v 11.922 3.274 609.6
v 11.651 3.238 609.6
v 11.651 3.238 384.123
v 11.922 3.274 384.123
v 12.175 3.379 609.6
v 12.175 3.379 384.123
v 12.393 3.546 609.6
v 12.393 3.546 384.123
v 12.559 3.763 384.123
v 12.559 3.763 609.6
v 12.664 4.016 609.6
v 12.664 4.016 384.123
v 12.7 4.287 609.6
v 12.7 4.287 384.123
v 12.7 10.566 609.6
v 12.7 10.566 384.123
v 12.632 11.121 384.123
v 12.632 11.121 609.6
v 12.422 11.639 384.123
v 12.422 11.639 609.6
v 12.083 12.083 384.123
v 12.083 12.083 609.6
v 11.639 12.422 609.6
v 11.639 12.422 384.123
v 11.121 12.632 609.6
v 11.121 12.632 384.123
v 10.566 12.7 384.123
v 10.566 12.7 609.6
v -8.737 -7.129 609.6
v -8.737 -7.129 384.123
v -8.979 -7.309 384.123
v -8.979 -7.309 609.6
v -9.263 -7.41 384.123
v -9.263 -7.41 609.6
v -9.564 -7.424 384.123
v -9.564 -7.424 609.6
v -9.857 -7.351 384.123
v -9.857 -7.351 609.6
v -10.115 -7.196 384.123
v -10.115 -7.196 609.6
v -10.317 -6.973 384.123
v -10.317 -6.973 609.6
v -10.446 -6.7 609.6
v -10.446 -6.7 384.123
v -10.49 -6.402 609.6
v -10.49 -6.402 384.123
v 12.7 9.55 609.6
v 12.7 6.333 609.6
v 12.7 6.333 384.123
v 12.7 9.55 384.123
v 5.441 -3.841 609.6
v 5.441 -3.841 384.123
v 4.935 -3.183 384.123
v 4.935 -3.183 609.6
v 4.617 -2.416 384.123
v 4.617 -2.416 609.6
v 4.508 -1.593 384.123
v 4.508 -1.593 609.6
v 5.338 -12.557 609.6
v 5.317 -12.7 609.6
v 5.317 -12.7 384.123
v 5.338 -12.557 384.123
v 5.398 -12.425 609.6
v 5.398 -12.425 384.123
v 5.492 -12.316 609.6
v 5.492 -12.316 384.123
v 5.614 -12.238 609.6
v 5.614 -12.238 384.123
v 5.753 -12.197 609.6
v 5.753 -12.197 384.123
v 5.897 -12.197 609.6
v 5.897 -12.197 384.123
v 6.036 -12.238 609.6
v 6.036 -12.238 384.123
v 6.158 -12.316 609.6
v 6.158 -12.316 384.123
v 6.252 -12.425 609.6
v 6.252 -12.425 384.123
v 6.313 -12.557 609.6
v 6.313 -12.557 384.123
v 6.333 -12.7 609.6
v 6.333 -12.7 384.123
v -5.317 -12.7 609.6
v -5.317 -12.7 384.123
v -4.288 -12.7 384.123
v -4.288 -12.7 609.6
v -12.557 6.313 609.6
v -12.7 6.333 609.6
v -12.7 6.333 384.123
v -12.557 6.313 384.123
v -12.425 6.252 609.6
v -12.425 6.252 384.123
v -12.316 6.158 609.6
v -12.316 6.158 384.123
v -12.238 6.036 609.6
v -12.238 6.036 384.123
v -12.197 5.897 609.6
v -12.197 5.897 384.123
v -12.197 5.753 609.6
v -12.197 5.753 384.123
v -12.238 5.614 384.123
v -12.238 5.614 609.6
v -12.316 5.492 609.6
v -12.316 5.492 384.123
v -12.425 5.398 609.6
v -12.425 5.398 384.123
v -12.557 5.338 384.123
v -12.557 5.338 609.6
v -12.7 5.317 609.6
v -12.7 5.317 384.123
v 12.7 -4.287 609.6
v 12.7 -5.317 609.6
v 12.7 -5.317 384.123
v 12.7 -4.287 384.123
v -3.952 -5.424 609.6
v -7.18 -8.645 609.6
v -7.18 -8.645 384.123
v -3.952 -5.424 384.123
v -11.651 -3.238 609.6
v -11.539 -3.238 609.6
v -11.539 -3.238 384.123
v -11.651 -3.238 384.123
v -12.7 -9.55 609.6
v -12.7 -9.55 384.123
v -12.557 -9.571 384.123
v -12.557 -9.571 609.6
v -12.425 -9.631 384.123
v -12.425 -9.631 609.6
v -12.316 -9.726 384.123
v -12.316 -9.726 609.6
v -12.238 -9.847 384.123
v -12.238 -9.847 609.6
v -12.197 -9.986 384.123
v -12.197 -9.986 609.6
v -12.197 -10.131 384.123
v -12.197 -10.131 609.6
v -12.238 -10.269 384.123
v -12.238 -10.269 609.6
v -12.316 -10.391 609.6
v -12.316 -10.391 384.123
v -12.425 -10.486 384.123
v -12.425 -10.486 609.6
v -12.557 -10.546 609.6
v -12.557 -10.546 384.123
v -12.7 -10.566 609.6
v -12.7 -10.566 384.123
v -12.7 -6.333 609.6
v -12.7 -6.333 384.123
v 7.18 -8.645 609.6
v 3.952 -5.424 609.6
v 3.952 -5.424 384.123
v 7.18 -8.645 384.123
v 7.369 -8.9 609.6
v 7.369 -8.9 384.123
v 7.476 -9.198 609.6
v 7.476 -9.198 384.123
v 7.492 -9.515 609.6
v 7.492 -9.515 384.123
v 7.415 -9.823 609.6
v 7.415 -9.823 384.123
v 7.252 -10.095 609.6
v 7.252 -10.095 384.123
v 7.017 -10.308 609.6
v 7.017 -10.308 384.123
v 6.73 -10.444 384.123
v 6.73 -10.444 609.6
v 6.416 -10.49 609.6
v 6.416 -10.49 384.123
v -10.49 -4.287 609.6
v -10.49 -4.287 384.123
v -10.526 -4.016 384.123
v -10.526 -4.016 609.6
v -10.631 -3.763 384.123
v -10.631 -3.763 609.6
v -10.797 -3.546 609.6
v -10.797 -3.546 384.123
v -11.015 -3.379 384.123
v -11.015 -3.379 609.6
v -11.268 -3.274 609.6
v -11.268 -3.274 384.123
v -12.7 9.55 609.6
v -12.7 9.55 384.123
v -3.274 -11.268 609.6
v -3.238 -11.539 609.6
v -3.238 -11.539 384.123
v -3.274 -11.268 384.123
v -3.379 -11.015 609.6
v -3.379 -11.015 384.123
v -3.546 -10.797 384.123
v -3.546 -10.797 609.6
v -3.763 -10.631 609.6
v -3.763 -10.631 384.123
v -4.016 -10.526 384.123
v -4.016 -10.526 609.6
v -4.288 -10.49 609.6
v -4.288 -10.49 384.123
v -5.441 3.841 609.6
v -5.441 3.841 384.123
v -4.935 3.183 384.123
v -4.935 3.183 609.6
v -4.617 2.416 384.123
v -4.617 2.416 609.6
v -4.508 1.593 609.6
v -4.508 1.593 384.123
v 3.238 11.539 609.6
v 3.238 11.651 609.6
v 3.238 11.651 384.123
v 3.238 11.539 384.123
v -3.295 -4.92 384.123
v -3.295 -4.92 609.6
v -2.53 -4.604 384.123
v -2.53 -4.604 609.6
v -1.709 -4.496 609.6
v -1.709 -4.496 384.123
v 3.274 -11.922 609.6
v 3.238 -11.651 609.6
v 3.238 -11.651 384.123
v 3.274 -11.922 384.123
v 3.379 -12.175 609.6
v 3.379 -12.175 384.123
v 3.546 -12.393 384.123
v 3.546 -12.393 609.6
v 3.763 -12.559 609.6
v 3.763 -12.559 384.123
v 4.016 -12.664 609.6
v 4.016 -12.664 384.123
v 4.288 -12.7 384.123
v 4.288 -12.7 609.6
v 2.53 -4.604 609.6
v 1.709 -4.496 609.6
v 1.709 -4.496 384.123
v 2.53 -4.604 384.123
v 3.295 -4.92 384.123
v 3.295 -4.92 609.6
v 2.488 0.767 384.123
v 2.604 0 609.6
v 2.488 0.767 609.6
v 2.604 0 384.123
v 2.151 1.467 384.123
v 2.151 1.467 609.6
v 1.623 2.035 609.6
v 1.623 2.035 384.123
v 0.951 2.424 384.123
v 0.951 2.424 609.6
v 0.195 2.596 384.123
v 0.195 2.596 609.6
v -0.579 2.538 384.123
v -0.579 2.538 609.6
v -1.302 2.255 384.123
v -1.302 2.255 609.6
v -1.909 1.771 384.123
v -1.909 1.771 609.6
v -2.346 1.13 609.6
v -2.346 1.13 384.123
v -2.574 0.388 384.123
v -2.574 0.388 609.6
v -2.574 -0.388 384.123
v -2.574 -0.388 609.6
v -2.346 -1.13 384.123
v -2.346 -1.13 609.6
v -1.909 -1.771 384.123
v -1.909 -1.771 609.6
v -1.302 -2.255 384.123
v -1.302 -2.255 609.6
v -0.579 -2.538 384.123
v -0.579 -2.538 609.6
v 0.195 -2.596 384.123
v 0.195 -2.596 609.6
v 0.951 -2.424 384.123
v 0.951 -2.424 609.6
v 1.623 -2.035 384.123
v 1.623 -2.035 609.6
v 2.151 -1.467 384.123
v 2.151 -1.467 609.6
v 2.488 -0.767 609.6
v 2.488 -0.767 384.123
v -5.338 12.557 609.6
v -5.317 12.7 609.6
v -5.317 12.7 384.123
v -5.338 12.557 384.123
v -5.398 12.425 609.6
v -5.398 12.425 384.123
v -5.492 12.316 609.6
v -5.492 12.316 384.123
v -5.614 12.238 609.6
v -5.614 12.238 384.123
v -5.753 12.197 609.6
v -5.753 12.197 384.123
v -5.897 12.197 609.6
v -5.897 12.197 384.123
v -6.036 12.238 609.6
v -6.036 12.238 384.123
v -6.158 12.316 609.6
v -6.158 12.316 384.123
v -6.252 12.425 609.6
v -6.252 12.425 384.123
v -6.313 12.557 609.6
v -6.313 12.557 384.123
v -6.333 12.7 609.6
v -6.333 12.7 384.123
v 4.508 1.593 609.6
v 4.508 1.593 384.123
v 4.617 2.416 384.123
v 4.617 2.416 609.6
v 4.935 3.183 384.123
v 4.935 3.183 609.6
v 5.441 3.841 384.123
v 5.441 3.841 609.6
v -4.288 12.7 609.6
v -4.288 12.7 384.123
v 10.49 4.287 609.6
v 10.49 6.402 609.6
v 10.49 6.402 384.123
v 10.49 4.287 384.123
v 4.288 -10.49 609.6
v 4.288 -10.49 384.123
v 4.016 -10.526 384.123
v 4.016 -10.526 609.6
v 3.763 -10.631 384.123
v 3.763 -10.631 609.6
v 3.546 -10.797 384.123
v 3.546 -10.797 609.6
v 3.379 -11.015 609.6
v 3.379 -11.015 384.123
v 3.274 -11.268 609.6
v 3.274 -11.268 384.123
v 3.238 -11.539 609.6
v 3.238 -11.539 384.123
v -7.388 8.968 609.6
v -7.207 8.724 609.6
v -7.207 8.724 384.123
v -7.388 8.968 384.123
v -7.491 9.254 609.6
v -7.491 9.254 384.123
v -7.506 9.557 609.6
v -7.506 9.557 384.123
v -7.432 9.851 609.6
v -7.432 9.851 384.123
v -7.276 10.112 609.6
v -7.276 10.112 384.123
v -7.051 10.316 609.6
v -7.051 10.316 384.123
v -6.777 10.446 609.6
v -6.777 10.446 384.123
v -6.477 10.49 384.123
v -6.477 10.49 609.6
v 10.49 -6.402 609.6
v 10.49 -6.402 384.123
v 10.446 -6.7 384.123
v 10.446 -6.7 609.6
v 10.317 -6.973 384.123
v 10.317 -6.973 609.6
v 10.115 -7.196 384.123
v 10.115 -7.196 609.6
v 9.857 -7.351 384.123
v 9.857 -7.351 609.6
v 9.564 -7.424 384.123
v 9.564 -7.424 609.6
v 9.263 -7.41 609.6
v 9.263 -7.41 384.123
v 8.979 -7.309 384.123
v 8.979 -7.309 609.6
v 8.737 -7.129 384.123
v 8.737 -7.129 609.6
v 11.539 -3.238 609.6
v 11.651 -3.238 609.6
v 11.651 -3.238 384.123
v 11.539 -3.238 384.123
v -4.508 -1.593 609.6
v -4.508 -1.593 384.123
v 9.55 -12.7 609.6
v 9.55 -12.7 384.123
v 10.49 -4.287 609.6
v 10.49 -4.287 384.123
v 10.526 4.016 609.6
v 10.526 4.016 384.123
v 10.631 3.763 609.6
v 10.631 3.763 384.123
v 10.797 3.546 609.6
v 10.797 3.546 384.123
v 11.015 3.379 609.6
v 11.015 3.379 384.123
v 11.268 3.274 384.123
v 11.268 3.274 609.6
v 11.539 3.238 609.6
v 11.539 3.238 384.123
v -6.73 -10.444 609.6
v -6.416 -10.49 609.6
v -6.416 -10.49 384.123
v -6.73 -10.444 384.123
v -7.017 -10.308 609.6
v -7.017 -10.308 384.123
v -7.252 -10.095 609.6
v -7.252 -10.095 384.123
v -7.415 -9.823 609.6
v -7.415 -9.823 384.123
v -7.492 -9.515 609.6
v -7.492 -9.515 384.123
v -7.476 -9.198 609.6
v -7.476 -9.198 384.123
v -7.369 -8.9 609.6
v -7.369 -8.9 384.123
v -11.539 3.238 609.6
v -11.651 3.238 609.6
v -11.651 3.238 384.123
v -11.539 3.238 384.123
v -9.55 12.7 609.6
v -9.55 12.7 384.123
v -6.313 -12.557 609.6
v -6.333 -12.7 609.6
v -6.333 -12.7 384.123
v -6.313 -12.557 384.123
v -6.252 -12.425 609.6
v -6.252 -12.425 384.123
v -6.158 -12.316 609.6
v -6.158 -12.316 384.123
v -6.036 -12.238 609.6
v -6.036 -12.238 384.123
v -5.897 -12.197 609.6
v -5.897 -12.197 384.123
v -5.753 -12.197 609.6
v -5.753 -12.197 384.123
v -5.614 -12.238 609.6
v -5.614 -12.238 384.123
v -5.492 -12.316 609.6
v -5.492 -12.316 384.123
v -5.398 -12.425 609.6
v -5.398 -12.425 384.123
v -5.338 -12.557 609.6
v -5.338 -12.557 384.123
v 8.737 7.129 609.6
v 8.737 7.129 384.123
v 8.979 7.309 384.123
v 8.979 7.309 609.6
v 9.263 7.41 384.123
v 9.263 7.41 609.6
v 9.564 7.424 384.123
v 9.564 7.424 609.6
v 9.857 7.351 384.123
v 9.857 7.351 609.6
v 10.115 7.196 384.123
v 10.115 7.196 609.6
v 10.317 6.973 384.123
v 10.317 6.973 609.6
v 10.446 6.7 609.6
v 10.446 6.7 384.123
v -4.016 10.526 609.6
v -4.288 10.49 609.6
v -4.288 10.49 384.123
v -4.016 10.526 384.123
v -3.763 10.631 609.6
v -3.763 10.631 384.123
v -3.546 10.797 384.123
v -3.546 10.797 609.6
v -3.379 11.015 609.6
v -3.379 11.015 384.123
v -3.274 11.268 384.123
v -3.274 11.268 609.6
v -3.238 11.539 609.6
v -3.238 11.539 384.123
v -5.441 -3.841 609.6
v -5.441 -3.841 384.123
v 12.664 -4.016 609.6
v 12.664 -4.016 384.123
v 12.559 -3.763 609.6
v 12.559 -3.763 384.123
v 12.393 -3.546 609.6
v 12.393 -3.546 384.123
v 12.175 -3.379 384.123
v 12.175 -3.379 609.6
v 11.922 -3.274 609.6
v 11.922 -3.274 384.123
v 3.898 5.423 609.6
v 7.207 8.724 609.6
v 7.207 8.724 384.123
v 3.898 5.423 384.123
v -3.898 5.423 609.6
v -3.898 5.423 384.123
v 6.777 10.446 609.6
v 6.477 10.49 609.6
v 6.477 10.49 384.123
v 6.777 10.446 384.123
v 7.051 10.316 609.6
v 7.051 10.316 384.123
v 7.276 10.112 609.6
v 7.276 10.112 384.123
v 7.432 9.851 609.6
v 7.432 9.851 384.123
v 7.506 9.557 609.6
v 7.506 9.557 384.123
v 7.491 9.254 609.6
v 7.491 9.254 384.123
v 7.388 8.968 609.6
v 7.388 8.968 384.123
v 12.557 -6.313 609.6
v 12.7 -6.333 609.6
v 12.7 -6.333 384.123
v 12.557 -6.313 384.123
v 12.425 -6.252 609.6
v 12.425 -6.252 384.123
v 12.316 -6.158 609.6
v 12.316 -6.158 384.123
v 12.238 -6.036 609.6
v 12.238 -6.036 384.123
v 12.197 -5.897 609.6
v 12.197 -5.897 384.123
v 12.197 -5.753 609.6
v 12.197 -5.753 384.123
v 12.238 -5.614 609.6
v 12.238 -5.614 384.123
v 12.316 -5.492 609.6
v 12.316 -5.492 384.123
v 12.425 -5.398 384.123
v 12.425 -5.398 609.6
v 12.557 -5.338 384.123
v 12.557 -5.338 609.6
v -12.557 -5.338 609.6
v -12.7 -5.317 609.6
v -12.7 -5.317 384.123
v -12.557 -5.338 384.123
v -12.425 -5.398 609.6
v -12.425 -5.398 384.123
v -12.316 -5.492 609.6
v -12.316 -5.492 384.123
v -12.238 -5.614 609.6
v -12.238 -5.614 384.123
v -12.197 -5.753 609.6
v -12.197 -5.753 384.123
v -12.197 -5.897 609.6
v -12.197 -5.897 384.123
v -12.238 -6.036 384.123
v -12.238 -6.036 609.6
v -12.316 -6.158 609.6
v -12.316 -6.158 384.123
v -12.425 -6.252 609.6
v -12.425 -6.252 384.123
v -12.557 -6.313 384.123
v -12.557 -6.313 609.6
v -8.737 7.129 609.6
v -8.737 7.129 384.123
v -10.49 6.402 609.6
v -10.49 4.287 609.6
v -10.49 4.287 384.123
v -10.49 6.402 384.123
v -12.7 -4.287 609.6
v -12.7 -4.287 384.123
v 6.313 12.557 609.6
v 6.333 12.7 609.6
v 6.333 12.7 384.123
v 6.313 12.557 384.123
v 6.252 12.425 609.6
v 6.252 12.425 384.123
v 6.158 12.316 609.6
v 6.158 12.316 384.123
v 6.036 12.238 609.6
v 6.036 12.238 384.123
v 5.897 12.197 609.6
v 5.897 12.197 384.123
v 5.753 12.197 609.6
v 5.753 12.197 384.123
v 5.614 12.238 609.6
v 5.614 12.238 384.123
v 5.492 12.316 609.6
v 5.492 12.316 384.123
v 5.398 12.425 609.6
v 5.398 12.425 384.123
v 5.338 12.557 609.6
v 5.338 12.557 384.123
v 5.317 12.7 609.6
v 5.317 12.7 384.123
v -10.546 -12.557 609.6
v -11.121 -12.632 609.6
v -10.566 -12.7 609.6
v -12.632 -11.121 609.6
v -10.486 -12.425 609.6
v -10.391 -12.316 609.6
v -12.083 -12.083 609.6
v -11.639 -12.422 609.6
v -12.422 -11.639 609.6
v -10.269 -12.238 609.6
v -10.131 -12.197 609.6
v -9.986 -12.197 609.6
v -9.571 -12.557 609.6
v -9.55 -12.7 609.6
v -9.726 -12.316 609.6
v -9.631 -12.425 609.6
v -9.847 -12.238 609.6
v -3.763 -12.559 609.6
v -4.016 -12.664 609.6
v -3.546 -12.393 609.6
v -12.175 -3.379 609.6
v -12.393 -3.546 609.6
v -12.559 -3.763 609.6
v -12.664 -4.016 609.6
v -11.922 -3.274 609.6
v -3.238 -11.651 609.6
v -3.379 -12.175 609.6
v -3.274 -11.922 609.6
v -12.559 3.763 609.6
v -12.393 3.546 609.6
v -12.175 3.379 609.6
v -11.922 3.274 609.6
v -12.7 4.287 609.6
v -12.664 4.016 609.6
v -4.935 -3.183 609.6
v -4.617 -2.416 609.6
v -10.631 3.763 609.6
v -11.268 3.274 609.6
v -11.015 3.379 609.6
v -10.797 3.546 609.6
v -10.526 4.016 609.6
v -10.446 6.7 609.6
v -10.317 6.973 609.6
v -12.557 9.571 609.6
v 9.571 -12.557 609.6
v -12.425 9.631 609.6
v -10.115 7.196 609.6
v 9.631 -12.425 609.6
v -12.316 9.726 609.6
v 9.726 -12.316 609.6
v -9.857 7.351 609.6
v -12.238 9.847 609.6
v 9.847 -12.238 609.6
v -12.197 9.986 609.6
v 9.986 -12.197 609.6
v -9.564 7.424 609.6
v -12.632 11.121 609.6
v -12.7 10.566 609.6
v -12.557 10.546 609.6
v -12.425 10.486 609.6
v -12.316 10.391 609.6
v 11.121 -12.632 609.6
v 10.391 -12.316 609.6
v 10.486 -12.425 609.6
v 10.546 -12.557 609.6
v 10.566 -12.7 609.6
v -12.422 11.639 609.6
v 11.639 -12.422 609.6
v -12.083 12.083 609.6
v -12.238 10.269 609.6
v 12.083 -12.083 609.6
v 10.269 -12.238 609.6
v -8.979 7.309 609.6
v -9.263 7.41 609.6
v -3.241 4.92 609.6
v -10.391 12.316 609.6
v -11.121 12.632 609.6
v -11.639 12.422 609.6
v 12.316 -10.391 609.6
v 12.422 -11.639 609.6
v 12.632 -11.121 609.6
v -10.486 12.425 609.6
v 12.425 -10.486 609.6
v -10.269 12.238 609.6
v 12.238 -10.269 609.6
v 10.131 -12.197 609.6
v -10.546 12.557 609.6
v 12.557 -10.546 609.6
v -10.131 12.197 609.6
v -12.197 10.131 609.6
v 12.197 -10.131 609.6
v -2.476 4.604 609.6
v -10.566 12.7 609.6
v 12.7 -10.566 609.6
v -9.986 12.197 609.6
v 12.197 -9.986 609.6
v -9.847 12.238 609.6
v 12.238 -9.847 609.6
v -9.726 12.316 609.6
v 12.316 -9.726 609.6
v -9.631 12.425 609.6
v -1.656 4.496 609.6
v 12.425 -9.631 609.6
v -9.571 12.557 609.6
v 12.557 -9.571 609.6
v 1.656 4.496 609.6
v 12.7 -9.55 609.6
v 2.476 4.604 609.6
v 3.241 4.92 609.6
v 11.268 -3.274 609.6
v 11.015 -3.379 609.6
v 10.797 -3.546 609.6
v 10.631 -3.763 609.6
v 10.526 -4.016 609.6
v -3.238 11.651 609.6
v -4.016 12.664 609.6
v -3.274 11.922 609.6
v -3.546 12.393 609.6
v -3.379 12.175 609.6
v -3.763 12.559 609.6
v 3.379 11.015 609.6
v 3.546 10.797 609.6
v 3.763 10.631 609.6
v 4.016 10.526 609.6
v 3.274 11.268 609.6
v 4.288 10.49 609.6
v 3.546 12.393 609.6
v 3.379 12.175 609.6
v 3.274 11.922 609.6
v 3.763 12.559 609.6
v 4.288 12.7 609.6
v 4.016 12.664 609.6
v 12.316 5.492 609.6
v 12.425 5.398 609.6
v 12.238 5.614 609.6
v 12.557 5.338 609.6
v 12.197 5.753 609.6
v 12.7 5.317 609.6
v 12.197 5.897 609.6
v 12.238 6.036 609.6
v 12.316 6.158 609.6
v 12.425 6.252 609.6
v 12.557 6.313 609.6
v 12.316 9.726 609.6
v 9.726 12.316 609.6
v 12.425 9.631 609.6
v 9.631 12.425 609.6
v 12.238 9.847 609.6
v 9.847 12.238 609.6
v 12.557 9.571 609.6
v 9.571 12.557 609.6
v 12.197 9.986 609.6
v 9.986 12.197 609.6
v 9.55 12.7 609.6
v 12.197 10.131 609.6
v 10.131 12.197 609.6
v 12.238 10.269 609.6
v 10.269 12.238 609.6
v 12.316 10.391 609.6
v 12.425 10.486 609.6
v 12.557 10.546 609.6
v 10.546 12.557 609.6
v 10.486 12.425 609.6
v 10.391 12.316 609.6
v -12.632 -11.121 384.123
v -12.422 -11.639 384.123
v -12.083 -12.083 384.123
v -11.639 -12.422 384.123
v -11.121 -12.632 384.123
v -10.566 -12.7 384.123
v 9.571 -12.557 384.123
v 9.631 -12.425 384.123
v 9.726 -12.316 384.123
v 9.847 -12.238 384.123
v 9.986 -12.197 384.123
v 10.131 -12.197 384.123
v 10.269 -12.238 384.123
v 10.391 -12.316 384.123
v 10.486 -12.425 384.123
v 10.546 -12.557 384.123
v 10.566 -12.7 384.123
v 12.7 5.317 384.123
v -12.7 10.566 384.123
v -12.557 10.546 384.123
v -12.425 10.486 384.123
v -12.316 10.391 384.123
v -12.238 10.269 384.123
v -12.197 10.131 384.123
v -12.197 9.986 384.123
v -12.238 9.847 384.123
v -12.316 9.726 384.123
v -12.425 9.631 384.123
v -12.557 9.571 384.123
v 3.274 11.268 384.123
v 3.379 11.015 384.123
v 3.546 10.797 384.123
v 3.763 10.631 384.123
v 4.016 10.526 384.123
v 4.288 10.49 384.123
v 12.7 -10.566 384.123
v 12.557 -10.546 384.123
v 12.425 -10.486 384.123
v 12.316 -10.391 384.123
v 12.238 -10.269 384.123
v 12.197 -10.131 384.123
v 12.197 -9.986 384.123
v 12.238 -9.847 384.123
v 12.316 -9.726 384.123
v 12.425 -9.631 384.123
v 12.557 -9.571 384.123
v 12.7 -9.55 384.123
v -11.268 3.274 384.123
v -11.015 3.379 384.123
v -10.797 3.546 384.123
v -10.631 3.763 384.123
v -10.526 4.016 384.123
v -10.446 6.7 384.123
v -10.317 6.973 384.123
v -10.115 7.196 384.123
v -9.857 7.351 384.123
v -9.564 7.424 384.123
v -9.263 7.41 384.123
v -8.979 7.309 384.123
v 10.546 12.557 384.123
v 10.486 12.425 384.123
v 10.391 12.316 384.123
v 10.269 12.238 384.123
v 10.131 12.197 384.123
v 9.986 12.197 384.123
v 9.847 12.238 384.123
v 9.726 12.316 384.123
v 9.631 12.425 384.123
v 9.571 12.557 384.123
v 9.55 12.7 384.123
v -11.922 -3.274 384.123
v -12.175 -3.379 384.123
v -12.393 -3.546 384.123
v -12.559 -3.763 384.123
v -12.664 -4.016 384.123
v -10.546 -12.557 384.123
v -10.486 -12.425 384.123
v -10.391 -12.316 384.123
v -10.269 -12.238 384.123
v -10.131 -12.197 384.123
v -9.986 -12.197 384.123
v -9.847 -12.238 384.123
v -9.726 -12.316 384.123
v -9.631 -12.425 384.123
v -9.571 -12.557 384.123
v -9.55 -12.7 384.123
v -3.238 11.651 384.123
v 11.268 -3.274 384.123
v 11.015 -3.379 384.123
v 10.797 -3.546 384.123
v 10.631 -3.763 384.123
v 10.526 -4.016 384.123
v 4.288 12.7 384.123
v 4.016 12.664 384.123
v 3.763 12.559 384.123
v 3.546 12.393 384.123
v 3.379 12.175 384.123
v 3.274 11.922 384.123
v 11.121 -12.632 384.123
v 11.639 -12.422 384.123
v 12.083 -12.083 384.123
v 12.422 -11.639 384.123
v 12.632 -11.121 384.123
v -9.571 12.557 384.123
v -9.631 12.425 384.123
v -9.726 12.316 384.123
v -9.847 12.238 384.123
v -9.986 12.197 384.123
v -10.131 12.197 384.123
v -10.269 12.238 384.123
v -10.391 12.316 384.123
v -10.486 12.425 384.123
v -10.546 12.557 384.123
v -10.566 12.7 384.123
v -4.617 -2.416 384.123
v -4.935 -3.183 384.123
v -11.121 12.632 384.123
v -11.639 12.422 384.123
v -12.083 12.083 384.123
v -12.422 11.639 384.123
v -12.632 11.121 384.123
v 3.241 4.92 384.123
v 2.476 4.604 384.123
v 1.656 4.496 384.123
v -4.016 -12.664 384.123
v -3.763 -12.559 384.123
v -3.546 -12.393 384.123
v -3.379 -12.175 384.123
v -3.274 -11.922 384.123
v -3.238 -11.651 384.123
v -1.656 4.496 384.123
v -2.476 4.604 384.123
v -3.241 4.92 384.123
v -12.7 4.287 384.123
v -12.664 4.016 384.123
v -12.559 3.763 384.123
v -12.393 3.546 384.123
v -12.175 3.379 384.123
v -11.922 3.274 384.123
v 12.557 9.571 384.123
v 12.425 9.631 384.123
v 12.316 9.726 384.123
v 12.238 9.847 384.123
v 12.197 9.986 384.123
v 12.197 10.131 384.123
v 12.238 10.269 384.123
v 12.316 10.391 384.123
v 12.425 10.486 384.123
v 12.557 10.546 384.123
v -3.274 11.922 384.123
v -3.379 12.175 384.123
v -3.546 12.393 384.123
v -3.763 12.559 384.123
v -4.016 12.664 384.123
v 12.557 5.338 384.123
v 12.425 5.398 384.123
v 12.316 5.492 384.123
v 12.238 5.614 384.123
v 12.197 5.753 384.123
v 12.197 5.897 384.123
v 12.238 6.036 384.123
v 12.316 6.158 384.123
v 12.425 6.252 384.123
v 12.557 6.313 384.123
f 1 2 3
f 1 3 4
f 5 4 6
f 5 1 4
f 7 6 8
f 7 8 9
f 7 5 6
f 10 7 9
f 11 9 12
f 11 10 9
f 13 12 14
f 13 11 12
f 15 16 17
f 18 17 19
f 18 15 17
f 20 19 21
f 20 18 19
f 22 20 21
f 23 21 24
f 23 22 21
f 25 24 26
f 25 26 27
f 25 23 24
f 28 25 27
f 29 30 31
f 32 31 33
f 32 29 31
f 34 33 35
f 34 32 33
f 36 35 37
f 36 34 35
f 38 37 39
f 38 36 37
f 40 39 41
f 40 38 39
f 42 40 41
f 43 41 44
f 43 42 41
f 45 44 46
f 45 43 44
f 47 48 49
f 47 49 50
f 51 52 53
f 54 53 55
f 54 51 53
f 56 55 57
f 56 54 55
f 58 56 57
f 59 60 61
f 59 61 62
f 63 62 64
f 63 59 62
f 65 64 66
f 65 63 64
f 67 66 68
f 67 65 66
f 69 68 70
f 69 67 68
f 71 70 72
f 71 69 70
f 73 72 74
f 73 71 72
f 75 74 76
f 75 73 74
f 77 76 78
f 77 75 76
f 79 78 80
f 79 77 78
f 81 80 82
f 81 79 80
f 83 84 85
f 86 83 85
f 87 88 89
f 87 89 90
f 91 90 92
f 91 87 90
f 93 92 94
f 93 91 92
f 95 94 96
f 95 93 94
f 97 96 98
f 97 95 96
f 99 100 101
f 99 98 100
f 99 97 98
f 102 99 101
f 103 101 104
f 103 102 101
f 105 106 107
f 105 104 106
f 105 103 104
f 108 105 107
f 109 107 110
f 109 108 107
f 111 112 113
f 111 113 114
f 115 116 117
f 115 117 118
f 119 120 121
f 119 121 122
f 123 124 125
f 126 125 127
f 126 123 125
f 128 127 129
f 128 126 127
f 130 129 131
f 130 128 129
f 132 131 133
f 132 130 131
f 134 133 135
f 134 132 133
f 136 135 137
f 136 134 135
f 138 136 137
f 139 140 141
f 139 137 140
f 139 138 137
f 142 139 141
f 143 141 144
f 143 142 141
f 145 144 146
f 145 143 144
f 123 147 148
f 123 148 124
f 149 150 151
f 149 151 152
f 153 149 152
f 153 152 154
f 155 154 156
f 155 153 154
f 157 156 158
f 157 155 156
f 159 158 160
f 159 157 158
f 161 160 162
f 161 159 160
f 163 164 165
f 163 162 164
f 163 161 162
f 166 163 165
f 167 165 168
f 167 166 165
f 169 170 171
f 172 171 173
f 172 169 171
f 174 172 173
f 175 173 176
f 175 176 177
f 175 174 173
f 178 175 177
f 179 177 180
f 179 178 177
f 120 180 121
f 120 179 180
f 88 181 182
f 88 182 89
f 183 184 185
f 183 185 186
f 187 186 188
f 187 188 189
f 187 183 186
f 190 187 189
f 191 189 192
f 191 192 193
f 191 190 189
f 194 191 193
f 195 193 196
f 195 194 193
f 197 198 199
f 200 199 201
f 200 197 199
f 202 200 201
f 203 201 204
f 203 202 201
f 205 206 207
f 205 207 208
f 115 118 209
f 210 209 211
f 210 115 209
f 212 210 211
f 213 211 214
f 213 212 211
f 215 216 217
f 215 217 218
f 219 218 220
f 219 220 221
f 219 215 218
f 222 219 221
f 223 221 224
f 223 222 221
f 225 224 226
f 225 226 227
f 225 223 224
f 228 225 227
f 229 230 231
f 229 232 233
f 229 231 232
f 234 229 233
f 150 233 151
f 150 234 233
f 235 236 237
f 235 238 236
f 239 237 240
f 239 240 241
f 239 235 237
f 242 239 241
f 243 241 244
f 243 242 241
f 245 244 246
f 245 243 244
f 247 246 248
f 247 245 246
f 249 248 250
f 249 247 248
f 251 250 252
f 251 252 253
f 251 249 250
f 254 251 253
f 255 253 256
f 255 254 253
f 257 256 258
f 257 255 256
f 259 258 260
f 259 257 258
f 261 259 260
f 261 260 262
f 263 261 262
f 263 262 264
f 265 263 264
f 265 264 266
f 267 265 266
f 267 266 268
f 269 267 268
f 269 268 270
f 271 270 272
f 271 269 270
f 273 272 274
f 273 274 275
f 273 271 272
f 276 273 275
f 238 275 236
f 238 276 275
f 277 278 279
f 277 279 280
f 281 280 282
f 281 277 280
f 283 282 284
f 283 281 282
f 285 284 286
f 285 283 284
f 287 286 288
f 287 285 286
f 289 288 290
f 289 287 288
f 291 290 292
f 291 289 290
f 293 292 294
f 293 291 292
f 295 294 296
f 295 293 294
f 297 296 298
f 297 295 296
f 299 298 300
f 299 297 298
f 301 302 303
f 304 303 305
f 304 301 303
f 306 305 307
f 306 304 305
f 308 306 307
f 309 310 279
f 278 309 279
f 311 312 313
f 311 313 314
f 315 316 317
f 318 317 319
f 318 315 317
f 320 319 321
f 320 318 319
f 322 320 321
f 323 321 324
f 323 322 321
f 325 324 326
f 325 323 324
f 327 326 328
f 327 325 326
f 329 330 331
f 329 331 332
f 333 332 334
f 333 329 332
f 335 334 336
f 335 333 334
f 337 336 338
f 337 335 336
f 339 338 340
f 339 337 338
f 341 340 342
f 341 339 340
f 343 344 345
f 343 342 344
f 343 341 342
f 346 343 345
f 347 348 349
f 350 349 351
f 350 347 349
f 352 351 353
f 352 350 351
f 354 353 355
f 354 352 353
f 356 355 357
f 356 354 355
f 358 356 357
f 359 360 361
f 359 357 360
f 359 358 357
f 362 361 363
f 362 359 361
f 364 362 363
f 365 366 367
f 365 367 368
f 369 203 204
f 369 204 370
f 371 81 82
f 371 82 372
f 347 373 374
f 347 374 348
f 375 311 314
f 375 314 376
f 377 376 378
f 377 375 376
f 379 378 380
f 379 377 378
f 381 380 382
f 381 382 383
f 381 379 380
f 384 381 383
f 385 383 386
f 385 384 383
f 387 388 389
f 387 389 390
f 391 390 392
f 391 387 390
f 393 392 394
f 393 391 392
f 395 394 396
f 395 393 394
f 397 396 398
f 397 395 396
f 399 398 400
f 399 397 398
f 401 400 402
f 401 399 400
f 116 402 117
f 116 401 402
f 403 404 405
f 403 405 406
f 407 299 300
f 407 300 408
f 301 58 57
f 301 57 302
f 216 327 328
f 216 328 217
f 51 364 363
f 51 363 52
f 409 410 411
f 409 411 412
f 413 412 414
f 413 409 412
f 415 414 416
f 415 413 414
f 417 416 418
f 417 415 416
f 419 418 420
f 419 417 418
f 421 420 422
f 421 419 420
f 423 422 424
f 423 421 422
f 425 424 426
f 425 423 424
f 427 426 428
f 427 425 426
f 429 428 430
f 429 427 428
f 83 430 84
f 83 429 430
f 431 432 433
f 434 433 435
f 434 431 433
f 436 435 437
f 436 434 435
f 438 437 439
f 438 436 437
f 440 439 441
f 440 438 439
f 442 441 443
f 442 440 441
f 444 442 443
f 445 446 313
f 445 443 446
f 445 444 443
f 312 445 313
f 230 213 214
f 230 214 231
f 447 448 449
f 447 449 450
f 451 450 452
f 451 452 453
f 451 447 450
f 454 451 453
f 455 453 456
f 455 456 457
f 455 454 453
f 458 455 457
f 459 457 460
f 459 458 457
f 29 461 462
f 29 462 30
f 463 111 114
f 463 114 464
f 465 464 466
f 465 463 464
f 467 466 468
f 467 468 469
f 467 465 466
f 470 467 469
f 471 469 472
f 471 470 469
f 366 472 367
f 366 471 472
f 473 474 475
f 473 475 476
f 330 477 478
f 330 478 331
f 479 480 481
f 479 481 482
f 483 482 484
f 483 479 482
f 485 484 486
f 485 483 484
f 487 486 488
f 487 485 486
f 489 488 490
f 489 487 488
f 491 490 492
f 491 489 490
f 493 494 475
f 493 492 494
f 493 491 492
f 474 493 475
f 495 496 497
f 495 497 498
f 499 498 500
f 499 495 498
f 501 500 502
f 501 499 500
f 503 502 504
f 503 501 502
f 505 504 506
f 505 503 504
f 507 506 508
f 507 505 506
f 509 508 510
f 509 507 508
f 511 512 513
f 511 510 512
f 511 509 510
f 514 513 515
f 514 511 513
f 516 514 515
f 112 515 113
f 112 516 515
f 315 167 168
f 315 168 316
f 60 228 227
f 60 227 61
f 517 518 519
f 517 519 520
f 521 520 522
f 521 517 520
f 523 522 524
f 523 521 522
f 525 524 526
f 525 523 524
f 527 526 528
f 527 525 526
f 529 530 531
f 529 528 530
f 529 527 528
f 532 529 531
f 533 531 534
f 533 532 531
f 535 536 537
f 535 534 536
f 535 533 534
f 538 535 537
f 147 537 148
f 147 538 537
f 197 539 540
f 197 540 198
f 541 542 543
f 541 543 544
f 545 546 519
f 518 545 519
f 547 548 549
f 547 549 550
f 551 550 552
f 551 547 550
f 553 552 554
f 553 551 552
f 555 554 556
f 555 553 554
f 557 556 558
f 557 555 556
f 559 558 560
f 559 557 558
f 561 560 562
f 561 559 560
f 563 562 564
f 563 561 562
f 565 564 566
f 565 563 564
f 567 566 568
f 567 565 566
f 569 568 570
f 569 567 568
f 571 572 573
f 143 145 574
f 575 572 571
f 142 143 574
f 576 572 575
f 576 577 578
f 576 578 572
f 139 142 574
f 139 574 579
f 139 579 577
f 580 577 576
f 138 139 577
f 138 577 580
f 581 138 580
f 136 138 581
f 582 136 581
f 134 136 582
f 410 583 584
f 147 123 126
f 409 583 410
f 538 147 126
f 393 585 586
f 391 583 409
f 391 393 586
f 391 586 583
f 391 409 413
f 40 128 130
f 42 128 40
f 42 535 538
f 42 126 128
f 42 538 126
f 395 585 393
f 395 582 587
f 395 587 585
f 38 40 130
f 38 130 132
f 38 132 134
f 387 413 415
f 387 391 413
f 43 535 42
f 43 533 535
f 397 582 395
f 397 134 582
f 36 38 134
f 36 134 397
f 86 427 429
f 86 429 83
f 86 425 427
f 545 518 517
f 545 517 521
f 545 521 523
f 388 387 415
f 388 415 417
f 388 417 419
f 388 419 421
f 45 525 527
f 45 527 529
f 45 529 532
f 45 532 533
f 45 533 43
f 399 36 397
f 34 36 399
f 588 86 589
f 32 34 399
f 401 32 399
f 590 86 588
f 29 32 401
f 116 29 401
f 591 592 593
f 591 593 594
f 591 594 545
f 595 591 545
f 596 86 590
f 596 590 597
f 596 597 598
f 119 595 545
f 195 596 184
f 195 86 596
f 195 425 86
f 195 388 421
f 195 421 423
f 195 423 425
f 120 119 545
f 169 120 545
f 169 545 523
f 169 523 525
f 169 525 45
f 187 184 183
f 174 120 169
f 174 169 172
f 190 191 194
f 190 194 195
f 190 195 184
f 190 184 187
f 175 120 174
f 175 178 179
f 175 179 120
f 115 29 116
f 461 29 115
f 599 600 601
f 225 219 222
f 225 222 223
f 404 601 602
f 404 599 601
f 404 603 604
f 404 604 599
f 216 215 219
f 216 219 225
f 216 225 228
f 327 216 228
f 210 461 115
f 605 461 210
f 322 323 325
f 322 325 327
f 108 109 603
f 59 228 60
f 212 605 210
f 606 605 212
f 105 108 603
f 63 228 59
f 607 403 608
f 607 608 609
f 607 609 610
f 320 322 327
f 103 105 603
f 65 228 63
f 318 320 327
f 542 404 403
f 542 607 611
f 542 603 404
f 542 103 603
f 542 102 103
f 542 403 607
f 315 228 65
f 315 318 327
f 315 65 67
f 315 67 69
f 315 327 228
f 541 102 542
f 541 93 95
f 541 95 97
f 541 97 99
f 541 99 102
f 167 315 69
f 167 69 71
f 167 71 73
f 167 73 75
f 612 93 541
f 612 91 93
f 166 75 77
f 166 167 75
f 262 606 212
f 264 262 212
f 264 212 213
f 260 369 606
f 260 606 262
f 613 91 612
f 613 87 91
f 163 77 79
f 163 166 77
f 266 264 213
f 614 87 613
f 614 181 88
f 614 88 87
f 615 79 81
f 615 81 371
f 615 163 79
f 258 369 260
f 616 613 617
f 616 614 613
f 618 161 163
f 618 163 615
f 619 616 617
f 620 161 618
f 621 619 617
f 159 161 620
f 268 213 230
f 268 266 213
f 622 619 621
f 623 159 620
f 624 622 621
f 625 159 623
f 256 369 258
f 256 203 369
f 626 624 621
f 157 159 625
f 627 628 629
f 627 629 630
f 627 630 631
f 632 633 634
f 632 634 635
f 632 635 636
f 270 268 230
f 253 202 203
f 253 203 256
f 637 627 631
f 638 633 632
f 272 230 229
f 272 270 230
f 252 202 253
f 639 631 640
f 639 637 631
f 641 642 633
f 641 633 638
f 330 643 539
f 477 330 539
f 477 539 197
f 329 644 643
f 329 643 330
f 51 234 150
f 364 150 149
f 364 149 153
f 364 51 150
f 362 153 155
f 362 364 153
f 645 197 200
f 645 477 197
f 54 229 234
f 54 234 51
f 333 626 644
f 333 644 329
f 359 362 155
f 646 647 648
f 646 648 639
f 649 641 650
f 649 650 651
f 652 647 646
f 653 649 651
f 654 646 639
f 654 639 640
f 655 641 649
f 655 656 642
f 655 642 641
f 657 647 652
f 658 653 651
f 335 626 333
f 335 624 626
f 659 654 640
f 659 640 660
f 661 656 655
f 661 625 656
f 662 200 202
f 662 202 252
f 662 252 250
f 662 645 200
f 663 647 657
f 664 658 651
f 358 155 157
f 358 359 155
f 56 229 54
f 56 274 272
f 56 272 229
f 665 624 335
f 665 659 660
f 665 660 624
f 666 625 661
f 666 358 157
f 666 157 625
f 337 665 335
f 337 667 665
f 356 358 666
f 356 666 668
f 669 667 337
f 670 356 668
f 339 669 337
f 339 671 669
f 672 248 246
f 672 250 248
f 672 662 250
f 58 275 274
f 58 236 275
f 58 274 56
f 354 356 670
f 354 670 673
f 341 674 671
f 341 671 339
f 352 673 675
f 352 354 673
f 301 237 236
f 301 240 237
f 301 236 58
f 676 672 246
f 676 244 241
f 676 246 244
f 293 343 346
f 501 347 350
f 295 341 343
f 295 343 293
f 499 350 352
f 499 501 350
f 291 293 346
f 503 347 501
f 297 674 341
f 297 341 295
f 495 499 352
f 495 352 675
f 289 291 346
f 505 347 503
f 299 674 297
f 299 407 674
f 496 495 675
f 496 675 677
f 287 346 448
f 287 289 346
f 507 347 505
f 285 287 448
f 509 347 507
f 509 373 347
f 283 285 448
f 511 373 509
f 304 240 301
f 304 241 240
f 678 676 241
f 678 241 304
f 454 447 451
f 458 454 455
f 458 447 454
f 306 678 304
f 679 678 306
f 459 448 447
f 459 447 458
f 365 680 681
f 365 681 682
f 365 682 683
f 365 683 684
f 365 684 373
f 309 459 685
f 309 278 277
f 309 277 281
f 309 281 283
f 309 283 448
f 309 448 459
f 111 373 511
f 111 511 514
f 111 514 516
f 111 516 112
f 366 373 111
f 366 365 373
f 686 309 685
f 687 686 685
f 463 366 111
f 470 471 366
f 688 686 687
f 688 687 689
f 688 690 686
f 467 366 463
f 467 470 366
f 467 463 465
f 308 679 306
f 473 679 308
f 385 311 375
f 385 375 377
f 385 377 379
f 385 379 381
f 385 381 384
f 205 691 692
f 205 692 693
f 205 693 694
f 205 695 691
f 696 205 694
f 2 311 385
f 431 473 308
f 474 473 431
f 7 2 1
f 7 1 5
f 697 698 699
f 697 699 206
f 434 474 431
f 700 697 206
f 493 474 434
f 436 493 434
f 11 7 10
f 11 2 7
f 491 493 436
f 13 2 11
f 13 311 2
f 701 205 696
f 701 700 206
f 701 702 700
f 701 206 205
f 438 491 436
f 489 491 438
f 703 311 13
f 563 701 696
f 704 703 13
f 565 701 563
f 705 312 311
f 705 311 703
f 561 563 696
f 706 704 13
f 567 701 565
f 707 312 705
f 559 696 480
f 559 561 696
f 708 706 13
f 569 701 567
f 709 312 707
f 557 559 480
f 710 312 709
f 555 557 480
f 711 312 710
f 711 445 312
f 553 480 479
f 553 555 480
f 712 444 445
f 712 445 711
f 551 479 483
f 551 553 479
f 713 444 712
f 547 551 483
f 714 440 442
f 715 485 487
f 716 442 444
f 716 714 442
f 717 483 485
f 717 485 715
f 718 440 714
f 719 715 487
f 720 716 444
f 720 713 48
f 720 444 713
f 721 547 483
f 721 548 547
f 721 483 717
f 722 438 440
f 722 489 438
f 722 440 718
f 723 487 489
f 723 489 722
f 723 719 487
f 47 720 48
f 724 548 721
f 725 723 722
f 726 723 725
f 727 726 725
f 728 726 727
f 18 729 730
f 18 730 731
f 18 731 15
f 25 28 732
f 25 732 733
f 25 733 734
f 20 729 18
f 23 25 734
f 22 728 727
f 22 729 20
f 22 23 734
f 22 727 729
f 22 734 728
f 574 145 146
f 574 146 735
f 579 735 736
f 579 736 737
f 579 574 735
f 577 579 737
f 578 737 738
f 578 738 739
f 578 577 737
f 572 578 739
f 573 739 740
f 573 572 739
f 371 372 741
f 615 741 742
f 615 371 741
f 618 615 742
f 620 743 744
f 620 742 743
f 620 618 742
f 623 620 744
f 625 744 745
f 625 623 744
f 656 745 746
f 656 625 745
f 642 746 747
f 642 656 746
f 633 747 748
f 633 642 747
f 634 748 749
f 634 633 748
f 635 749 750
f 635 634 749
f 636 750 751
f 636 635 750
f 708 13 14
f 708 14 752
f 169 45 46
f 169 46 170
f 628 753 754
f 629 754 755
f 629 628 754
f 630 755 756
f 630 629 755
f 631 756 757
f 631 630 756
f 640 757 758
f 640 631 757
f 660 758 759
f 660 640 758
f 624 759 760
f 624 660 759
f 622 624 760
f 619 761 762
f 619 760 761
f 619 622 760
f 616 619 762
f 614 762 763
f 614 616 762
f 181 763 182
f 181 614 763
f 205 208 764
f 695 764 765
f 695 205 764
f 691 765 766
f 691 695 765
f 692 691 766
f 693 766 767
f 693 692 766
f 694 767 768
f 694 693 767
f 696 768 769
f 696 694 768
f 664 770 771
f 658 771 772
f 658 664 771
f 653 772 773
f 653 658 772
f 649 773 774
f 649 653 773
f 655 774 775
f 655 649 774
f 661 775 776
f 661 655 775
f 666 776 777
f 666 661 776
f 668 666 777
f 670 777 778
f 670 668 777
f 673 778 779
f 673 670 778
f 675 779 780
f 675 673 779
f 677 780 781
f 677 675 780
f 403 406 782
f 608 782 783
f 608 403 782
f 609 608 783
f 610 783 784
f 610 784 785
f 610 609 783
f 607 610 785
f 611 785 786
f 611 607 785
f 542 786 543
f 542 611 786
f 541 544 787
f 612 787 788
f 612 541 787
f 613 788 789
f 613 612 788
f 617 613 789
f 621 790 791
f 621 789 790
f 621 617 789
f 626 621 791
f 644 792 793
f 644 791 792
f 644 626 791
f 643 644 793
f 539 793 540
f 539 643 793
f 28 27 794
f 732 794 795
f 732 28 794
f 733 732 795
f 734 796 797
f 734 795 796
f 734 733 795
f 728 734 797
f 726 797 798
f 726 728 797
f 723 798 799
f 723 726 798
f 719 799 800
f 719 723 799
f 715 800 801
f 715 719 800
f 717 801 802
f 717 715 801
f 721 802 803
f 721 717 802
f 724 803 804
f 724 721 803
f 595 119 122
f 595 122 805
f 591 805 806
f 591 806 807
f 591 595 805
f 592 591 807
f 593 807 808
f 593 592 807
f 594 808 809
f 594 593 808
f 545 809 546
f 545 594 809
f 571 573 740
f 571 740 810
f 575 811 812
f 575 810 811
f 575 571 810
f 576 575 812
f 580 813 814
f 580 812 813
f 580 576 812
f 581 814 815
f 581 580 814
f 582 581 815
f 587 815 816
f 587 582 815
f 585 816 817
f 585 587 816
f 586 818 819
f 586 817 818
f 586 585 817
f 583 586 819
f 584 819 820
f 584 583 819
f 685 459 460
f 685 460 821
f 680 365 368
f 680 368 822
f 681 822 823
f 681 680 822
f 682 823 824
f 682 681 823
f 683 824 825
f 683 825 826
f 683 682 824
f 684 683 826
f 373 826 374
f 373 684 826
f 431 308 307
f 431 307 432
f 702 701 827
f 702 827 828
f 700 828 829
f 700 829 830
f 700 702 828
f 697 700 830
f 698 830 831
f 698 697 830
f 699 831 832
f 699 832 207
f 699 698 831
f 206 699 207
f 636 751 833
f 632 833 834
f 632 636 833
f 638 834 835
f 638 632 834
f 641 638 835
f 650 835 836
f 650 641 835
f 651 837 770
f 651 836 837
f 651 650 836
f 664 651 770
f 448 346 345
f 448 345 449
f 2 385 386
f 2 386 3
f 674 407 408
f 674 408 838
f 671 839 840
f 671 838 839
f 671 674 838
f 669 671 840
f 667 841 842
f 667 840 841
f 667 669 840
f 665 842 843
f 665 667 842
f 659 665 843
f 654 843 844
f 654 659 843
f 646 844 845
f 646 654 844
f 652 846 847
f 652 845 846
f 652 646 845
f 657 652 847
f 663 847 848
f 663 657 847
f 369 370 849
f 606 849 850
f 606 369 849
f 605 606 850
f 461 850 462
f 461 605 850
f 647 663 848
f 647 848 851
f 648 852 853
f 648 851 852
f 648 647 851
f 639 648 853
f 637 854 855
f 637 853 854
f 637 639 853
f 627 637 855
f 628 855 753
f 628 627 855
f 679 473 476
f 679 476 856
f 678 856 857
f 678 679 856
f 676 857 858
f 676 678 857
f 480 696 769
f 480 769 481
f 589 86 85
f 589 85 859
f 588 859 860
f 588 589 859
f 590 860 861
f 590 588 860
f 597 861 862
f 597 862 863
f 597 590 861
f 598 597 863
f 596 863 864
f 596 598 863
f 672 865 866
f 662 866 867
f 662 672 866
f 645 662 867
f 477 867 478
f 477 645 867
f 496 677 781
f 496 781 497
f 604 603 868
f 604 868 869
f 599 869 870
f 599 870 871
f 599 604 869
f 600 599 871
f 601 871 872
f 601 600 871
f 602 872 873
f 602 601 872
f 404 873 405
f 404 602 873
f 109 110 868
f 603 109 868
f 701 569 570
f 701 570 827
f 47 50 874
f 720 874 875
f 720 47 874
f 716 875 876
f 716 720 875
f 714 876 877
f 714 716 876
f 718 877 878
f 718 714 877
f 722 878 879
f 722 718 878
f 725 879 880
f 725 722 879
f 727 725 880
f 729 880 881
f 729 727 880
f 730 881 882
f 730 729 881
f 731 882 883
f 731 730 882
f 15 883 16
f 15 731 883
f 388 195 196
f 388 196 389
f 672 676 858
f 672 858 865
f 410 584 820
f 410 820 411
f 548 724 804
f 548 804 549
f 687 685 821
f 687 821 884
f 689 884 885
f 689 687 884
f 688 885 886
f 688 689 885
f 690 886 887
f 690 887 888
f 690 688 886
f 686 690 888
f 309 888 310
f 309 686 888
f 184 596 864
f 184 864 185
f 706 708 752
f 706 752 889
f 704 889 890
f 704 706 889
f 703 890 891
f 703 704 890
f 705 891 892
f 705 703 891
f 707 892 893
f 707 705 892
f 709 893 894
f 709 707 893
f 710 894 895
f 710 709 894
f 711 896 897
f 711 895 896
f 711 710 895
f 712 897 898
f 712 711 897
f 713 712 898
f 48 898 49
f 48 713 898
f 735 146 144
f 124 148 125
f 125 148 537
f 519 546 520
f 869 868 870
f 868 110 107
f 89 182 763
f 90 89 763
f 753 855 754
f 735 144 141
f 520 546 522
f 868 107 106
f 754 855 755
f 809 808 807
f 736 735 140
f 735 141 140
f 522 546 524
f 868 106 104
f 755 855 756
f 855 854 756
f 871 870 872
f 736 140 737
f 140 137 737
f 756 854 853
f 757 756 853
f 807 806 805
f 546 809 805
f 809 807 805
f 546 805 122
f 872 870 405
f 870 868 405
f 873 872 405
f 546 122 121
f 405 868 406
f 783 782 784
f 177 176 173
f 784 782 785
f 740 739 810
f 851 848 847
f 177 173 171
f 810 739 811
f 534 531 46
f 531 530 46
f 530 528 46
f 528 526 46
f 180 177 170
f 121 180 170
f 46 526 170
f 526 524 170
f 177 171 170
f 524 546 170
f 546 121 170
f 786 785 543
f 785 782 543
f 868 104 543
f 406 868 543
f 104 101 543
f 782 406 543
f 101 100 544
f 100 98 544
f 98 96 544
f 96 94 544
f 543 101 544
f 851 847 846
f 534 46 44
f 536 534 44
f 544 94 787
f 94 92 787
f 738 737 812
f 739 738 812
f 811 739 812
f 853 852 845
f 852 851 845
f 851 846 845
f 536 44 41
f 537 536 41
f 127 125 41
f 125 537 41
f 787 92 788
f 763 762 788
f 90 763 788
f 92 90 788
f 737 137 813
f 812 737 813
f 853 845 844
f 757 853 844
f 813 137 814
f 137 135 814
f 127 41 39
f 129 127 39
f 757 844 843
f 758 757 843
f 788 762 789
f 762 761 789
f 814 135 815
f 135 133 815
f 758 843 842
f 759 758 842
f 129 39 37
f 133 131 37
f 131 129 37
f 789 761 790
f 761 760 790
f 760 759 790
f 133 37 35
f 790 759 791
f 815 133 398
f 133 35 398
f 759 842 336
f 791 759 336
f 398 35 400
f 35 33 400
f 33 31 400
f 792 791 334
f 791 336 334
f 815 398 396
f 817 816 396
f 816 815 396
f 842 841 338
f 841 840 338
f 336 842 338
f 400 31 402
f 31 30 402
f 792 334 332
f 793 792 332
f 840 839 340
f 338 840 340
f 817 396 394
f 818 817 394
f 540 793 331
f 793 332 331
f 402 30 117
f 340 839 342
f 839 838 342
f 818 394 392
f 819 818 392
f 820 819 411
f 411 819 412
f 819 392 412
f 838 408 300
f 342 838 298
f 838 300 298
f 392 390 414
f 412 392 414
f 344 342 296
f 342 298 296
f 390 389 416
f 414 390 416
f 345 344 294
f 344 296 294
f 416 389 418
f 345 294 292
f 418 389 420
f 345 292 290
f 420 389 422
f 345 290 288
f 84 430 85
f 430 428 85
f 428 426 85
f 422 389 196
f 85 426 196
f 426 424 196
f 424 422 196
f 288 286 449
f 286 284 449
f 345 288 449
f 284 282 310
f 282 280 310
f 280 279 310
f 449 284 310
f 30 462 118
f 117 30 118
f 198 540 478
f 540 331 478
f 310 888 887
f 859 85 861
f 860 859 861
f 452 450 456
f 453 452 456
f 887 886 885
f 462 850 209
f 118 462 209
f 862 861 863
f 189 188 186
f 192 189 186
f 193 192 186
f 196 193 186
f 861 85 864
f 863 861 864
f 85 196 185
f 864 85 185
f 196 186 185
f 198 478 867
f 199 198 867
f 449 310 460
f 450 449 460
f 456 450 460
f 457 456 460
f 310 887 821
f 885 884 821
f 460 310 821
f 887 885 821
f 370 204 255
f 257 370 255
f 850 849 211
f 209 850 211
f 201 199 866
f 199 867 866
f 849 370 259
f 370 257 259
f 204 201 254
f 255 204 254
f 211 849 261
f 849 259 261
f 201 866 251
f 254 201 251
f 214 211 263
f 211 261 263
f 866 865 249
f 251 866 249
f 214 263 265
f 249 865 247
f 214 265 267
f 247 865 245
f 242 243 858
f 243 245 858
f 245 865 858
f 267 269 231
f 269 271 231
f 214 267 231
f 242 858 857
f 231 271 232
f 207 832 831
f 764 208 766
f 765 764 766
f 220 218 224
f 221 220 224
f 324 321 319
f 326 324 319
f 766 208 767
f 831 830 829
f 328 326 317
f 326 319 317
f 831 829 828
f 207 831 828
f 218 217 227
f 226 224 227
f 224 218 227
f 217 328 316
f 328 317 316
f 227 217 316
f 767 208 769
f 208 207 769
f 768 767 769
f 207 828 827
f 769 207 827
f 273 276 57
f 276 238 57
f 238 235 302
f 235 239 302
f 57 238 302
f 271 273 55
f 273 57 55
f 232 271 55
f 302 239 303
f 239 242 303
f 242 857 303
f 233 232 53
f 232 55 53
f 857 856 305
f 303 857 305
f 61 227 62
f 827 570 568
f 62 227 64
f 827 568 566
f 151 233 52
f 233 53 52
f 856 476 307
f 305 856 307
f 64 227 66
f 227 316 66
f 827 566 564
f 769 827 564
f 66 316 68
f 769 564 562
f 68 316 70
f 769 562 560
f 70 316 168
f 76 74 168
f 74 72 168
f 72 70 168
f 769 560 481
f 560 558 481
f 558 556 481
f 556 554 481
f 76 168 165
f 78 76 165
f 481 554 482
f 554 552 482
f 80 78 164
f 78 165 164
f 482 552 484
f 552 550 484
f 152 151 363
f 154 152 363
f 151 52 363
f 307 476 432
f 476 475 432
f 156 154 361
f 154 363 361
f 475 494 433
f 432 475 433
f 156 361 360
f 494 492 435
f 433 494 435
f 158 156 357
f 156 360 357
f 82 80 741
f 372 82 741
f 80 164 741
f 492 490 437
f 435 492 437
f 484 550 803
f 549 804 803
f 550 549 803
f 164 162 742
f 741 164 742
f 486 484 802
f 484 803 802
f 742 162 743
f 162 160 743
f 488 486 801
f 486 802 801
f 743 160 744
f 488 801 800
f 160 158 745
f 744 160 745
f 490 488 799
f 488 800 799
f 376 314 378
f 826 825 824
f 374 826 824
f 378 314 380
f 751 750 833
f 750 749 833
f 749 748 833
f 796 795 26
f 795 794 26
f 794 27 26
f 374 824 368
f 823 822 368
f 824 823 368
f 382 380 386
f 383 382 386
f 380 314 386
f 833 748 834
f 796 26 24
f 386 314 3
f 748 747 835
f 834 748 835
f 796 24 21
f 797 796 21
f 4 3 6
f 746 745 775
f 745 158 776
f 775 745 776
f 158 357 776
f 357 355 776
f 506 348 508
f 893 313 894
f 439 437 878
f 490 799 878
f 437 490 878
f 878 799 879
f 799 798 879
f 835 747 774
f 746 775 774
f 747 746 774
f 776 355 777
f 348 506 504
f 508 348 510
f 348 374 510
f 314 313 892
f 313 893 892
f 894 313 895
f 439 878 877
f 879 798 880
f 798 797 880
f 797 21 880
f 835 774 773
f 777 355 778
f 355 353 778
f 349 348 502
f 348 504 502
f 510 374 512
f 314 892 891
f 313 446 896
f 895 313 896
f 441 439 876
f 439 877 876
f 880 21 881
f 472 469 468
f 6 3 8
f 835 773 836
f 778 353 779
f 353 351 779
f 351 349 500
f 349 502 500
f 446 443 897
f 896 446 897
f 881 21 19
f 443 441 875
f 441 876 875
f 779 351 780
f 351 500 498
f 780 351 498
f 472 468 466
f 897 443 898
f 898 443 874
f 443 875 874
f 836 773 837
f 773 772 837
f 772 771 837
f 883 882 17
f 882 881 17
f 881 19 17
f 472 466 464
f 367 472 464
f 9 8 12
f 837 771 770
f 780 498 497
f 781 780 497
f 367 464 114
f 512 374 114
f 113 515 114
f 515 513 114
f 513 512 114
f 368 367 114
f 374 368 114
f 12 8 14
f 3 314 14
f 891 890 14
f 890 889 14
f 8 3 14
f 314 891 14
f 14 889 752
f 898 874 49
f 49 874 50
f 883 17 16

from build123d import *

# Parameters (mm, degrees)
SKETCH1_R               = 2.6035
BOSS_EXTRUDE1_DEPTH     = 609.6
SKETCH2_W               = 52.583844564
SKETCH2_H               = 999.926982924
CUT_EXTRUDE1_DEPTH      = 21.082
CUT_EXTRUDE1_DEPTH_BACK = 22.352


with BuildPart() as part:
    # Sketch1 → Boss-Extrude1 (new body, symmetric)
    with BuildSketch(Plane.XY):
        with BuildLine():
            Line((-7.179650497, -8.645192506), (-3.952270251, -5.423690499))
            ThreePointArc((-3.952270251, -5.423690499), (-2.922936451, -4.736929036), (-1.709253557, -4.4958))
            Line((-1.709253557, -4.4958), (1.709253557, -4.4958))
            ThreePointArc((1.709253557, -4.4958), (2.922936451, -4.736929036), (3.952270251, -5.423690499))
            Line((3.952270251, -5.423690499), (7.179650497, -8.645192506))
            ThreePointArc((7.179650497, -8.645192506), (7.41473083, -9.822813117), (6.416408329, -10.4902))
            Line((6.416408329, -10.4902), (4.287512407, -10.4902))
            ThreePointArc((4.287512407, -10.4902), (3.54574862, -10.79744862), (3.2385, -11.539212407))
            Line((3.2385, -11.539212407), (3.2385, -11.650987593))
            ThreePointArc((3.2385, -11.650987593), (3.54574862, -12.39275138), (4.287512407, -12.7))
            Line((4.287512407, -12.7), (5.317126718, -12.7))
            ThreePointArc((5.317126718, -12.7), (5.825126718, -12.192), (6.333126718, -12.7))
            Line((6.333126718, -12.7), (9.550443118, -12.7))
            ThreePointArc((9.550443118, -12.7), (10.058366869, -12.192000006), (10.566443095, -12.699847501))
            ThreePointArc((10.566443095, -12.699847501), (12.082537762, -12.08250727), (12.699846982, -10.566399977))
            ThreePointArc((12.699846982, -10.566399977), (12.192000006, -10.058323491), (12.7, -9.5504))
            Line((12.7, -9.5504), (12.7, -6.3330836))
            ThreePointArc((12.7, -6.3330836), (12.192, -5.8250836), (12.7, -5.3170836))
            Line((12.7, -5.3170836), (12.7, -4.287469289))
            ThreePointArc((12.7, -4.287469289), (12.39275138, -3.545705502), (11.650987593, -3.238456882))
            Line((11.650987593, -3.238456882), (11.539212407, -3.238456882))
            ThreePointArc((11.539212407, -3.238456882), (10.79744862, -3.545705502), (10.4902, -4.287469289))
            Line((10.4902, -4.287469289), (10.4902, -6.402089023))
            ThreePointArc((10.4902, -6.402089023), (9.856505071, -7.351067942), (8.737131347, -7.129408934))
            Line((8.737131347, -7.129408934), (5.441005833, -3.840816462))
            ThreePointArc((5.441005833, -3.840816462), (4.750877967, -2.809883091), (4.5085, -1.593185507))
            Line((4.5085, -1.593185507), (4.5085, 1.593185507))
            ThreePointArc((4.5085, 1.593185507), (4.750877967, 2.809883091), (5.441005833, 3.840816462))
            Line((5.441005833, 3.840816462), (8.737131347, 7.129408934))
            ThreePointArc((8.737131347, 7.129408934), (9.856505071, 7.351067942), (10.4902, 6.402089023))
            Line((10.4902, 6.402089023), (10.4902, 4.287469289))
            ThreePointArc((10.4902, 4.287469289), (10.79744862, 3.545705502), (11.539212407, 3.238456882))
            Line((11.539212407, 3.238456882), (11.650987593, 3.238456882))
            ThreePointArc((11.650987593, 3.238456882), (12.39275138, 3.545705502), (12.7, 4.287469289))
            Line((12.7, 4.287469289), (12.7, 5.3170836))
            ThreePointArc((12.7, 5.3170836), (12.192, 5.8250836), (12.7, 6.3330836))
            Line((12.7, 6.3330836), (12.7, 9.5504))
            ThreePointArc((12.7, 9.5504), (12.192000006, 10.058323491), (12.699846982, 10.566399977))
            ThreePointArc((12.699846982, 10.566399977), (12.082537762, 12.08250727), (10.566443095, 12.699847501))
            ThreePointArc((10.566443095, 12.699847501), (10.058366869, 12.192000006), (9.550443118, 12.7))
            Line((9.550443118, 12.7), (6.333126718, 12.7))
            ThreePointArc((6.333126718, 12.7), (5.825126718, 12.192), (5.317126718, 12.7))
            Line((5.317126718, 12.7), (4.287512407, 12.7))
            ThreePointArc((4.287512407, 12.7), (3.54574862, 12.39275138), (3.2385, 11.650987593))
            Line((3.2385, 11.650987593), (3.2385, 11.539212407))
            ThreePointArc((3.2385, 11.539212407), (3.54574862, 10.79744862), (4.287512407, 10.4902))
            Line((4.287512407, 10.4902), (6.476788598, 10.4902))
            ThreePointArc((6.476788598, 10.4902), (7.432222385, 9.85140422), (7.207036008, 8.724370562))
            Line((7.207036008, 8.724370562), (3.898272566, 5.423169045))
            ThreePointArc((3.898272566, 5.423169045), (2.869120213, 4.736787962), (1.655778399, 4.4958))
            Line((1.655778399, 4.4958), (-1.655778399, 4.4958))
            ThreePointArc((-1.655778399, 4.4958), (-2.869120213, 4.736787962), (-3.898272566, 5.423169045))
            Line((-3.898272566, 5.423169045), (-7.207036008, 8.724370562))
            ThreePointArc((-7.207036008, 8.724370562), (-7.432222385, 9.85140422), (-6.476788598, 10.4902))
            Line((-6.476788598, 10.4902), (-4.287512407, 10.4902))
            ThreePointArc((-4.287512407, 10.4902), (-3.54574862, 10.79744862), (-3.2385, 11.539212407))
            Line((-3.2385, 11.539212407), (-3.2385, 11.650987593))
            ThreePointArc((-3.2385, 11.650987593), (-3.54574862, 12.39275138), (-4.287512407, 12.7))
            Line((-4.287512407, 12.7), (-5.317126718, 12.7))
            ThreePointArc((-5.317126718, 12.7), (-5.825126718, 12.192), (-6.333126718, 12.7))
            Line((-6.333126718, 12.7), (-9.550443118, 12.7))
            ThreePointArc((-9.550443118, 12.7), (-10.058366869, 12.192000006), (-10.566443095, 12.699847501))
            ThreePointArc((-10.566443095, 12.699847501), (-12.082537762, 12.08250727), (-12.699846982, 10.566399977))
            ThreePointArc((-12.699846982, 10.566399977), (-12.192000006, 10.058323491), (-12.7, 9.5504))
            Line((-12.7, 9.5504), (-12.7, 6.3330836))
            ThreePointArc((-12.7, 6.3330836), (-12.192, 5.8250836), (-12.7, 5.3170836))
            Line((-12.7, 5.3170836), (-12.7, 4.287469289))
            ThreePointArc((-12.7, 4.287469289), (-12.39275138, 3.545705502), (-11.650987593, 3.238456882))
            Line((-11.650987593, 3.238456882), (-11.539212407, 3.238456882))
            ThreePointArc((-11.539212407, 3.238456882), (-10.79744862, 3.545705502), (-10.4902, 4.287469289))
            Line((-10.4902, 4.287469289), (-10.4902, 6.402089023))
            ThreePointArc((-10.4902, 6.402089023), (-9.856505071, 7.351067942), (-8.737131347, 7.129408934))
            Line((-8.737131347, 7.129408934), (-5.441005833, 3.840816462))
            ThreePointArc((-5.441005833, 3.840816462), (-4.750877967, 2.809883091), (-4.5085, 1.593185507))
            Line((-4.5085, 1.593185507), (-4.5085, -1.593185507))
            ThreePointArc((-4.5085, -1.593185507), (-4.750877967, -2.809883091), (-5.441005833, -3.840816462))
            Line((-5.441005833, -3.840816462), (-8.737131347, -7.129408934))
            ThreePointArc((-8.737131347, -7.129408934), (-9.856505071, -7.351067942), (-10.4902, -6.402089023))
            Line((-10.4902, -6.402089023), (-10.4902, -4.287469289))
            ThreePointArc((-10.4902, -4.287469289), (-10.79744862, -3.545705502), (-11.539212407, -3.238456882))
            Line((-11.539212407, -3.238456882), (-11.650987593, -3.238456882))
            ThreePointArc((-11.650987593, -3.238456882), (-12.39275138, -3.545705502), (-12.7, -4.287469289))
            Line((-12.7, -4.287469289), (-12.7, -5.3170836))
            ThreePointArc((-12.7, -5.3170836), (-12.192, -5.8250836), (-12.7, -6.3330836))
            Line((-12.7, -6.3330836), (-12.7, -9.5504))
            ThreePointArc((-12.7, -9.5504), (-12.192000006, -10.058323491), (-12.699846982, -10.566399977))
            ThreePointArc((-12.699846982, -10.566399977), (-12.082537762, -12.08250727), (-10.566443095, -12.699847501))
            ThreePointArc((-10.566443095, -12.699847501), (-10.058366869, -12.192000006), (-9.550443118, -12.7))
            Line((-9.550443118, -12.7), (-6.333126718, -12.7))
            ThreePointArc((-6.333126718, -12.7), (-5.825126718, -12.192), (-5.317126718, -12.7))
            Line((-5.317126718, -12.7), (-4.287512407, -12.7))
            ThreePointArc((-4.287512407, -12.7), (-3.54574862, -12.39275138), (-3.2385, -11.650987593))
            Line((-3.2385, -11.650987593), (-3.2385, -11.539212407))
            ThreePointArc((-3.2385, -11.539212407), (-3.54574862, -10.79744862), (-4.287512407, -10.4902))
            Line((-4.287512407, -10.4902), (-6.416408329, -10.4902))
            ThreePointArc((-6.416408329, -10.4902), (-7.41473083, -9.822813117), (-7.179650497, -8.645192506))
        make_face()
        Circle(SKETCH1_R, mode=Mode.SUBTRACT)
    extrude(amount=BOSS_EXTRUDE1_DEPTH, both=True)

    # Sketch2 → Cut-Extrude1 (cut, two sides)
    with BuildSketch(Plane(origin=(-0.793875106, -0.795693603, 0), x_dir=(0.707915262, -0.706297375, 0), z_dir=(-0.706297375, -0.707915262, 0))) as cut_extrude1_sk:
        with Locations((4.622489738, -115.840698227)):
            Rectangle(SKETCH2_W, SKETCH2_H)
    extrude(amount=CUT_EXTRUDE1_DEPTH, mode=Mode.SUBTRACT)
    extrude(cut_extrude1_sk.sketch, amount=-CUT_EXTRUDE1_DEPTH_BACK, mode=Mode.SUBTRACT)


solid = part.part
